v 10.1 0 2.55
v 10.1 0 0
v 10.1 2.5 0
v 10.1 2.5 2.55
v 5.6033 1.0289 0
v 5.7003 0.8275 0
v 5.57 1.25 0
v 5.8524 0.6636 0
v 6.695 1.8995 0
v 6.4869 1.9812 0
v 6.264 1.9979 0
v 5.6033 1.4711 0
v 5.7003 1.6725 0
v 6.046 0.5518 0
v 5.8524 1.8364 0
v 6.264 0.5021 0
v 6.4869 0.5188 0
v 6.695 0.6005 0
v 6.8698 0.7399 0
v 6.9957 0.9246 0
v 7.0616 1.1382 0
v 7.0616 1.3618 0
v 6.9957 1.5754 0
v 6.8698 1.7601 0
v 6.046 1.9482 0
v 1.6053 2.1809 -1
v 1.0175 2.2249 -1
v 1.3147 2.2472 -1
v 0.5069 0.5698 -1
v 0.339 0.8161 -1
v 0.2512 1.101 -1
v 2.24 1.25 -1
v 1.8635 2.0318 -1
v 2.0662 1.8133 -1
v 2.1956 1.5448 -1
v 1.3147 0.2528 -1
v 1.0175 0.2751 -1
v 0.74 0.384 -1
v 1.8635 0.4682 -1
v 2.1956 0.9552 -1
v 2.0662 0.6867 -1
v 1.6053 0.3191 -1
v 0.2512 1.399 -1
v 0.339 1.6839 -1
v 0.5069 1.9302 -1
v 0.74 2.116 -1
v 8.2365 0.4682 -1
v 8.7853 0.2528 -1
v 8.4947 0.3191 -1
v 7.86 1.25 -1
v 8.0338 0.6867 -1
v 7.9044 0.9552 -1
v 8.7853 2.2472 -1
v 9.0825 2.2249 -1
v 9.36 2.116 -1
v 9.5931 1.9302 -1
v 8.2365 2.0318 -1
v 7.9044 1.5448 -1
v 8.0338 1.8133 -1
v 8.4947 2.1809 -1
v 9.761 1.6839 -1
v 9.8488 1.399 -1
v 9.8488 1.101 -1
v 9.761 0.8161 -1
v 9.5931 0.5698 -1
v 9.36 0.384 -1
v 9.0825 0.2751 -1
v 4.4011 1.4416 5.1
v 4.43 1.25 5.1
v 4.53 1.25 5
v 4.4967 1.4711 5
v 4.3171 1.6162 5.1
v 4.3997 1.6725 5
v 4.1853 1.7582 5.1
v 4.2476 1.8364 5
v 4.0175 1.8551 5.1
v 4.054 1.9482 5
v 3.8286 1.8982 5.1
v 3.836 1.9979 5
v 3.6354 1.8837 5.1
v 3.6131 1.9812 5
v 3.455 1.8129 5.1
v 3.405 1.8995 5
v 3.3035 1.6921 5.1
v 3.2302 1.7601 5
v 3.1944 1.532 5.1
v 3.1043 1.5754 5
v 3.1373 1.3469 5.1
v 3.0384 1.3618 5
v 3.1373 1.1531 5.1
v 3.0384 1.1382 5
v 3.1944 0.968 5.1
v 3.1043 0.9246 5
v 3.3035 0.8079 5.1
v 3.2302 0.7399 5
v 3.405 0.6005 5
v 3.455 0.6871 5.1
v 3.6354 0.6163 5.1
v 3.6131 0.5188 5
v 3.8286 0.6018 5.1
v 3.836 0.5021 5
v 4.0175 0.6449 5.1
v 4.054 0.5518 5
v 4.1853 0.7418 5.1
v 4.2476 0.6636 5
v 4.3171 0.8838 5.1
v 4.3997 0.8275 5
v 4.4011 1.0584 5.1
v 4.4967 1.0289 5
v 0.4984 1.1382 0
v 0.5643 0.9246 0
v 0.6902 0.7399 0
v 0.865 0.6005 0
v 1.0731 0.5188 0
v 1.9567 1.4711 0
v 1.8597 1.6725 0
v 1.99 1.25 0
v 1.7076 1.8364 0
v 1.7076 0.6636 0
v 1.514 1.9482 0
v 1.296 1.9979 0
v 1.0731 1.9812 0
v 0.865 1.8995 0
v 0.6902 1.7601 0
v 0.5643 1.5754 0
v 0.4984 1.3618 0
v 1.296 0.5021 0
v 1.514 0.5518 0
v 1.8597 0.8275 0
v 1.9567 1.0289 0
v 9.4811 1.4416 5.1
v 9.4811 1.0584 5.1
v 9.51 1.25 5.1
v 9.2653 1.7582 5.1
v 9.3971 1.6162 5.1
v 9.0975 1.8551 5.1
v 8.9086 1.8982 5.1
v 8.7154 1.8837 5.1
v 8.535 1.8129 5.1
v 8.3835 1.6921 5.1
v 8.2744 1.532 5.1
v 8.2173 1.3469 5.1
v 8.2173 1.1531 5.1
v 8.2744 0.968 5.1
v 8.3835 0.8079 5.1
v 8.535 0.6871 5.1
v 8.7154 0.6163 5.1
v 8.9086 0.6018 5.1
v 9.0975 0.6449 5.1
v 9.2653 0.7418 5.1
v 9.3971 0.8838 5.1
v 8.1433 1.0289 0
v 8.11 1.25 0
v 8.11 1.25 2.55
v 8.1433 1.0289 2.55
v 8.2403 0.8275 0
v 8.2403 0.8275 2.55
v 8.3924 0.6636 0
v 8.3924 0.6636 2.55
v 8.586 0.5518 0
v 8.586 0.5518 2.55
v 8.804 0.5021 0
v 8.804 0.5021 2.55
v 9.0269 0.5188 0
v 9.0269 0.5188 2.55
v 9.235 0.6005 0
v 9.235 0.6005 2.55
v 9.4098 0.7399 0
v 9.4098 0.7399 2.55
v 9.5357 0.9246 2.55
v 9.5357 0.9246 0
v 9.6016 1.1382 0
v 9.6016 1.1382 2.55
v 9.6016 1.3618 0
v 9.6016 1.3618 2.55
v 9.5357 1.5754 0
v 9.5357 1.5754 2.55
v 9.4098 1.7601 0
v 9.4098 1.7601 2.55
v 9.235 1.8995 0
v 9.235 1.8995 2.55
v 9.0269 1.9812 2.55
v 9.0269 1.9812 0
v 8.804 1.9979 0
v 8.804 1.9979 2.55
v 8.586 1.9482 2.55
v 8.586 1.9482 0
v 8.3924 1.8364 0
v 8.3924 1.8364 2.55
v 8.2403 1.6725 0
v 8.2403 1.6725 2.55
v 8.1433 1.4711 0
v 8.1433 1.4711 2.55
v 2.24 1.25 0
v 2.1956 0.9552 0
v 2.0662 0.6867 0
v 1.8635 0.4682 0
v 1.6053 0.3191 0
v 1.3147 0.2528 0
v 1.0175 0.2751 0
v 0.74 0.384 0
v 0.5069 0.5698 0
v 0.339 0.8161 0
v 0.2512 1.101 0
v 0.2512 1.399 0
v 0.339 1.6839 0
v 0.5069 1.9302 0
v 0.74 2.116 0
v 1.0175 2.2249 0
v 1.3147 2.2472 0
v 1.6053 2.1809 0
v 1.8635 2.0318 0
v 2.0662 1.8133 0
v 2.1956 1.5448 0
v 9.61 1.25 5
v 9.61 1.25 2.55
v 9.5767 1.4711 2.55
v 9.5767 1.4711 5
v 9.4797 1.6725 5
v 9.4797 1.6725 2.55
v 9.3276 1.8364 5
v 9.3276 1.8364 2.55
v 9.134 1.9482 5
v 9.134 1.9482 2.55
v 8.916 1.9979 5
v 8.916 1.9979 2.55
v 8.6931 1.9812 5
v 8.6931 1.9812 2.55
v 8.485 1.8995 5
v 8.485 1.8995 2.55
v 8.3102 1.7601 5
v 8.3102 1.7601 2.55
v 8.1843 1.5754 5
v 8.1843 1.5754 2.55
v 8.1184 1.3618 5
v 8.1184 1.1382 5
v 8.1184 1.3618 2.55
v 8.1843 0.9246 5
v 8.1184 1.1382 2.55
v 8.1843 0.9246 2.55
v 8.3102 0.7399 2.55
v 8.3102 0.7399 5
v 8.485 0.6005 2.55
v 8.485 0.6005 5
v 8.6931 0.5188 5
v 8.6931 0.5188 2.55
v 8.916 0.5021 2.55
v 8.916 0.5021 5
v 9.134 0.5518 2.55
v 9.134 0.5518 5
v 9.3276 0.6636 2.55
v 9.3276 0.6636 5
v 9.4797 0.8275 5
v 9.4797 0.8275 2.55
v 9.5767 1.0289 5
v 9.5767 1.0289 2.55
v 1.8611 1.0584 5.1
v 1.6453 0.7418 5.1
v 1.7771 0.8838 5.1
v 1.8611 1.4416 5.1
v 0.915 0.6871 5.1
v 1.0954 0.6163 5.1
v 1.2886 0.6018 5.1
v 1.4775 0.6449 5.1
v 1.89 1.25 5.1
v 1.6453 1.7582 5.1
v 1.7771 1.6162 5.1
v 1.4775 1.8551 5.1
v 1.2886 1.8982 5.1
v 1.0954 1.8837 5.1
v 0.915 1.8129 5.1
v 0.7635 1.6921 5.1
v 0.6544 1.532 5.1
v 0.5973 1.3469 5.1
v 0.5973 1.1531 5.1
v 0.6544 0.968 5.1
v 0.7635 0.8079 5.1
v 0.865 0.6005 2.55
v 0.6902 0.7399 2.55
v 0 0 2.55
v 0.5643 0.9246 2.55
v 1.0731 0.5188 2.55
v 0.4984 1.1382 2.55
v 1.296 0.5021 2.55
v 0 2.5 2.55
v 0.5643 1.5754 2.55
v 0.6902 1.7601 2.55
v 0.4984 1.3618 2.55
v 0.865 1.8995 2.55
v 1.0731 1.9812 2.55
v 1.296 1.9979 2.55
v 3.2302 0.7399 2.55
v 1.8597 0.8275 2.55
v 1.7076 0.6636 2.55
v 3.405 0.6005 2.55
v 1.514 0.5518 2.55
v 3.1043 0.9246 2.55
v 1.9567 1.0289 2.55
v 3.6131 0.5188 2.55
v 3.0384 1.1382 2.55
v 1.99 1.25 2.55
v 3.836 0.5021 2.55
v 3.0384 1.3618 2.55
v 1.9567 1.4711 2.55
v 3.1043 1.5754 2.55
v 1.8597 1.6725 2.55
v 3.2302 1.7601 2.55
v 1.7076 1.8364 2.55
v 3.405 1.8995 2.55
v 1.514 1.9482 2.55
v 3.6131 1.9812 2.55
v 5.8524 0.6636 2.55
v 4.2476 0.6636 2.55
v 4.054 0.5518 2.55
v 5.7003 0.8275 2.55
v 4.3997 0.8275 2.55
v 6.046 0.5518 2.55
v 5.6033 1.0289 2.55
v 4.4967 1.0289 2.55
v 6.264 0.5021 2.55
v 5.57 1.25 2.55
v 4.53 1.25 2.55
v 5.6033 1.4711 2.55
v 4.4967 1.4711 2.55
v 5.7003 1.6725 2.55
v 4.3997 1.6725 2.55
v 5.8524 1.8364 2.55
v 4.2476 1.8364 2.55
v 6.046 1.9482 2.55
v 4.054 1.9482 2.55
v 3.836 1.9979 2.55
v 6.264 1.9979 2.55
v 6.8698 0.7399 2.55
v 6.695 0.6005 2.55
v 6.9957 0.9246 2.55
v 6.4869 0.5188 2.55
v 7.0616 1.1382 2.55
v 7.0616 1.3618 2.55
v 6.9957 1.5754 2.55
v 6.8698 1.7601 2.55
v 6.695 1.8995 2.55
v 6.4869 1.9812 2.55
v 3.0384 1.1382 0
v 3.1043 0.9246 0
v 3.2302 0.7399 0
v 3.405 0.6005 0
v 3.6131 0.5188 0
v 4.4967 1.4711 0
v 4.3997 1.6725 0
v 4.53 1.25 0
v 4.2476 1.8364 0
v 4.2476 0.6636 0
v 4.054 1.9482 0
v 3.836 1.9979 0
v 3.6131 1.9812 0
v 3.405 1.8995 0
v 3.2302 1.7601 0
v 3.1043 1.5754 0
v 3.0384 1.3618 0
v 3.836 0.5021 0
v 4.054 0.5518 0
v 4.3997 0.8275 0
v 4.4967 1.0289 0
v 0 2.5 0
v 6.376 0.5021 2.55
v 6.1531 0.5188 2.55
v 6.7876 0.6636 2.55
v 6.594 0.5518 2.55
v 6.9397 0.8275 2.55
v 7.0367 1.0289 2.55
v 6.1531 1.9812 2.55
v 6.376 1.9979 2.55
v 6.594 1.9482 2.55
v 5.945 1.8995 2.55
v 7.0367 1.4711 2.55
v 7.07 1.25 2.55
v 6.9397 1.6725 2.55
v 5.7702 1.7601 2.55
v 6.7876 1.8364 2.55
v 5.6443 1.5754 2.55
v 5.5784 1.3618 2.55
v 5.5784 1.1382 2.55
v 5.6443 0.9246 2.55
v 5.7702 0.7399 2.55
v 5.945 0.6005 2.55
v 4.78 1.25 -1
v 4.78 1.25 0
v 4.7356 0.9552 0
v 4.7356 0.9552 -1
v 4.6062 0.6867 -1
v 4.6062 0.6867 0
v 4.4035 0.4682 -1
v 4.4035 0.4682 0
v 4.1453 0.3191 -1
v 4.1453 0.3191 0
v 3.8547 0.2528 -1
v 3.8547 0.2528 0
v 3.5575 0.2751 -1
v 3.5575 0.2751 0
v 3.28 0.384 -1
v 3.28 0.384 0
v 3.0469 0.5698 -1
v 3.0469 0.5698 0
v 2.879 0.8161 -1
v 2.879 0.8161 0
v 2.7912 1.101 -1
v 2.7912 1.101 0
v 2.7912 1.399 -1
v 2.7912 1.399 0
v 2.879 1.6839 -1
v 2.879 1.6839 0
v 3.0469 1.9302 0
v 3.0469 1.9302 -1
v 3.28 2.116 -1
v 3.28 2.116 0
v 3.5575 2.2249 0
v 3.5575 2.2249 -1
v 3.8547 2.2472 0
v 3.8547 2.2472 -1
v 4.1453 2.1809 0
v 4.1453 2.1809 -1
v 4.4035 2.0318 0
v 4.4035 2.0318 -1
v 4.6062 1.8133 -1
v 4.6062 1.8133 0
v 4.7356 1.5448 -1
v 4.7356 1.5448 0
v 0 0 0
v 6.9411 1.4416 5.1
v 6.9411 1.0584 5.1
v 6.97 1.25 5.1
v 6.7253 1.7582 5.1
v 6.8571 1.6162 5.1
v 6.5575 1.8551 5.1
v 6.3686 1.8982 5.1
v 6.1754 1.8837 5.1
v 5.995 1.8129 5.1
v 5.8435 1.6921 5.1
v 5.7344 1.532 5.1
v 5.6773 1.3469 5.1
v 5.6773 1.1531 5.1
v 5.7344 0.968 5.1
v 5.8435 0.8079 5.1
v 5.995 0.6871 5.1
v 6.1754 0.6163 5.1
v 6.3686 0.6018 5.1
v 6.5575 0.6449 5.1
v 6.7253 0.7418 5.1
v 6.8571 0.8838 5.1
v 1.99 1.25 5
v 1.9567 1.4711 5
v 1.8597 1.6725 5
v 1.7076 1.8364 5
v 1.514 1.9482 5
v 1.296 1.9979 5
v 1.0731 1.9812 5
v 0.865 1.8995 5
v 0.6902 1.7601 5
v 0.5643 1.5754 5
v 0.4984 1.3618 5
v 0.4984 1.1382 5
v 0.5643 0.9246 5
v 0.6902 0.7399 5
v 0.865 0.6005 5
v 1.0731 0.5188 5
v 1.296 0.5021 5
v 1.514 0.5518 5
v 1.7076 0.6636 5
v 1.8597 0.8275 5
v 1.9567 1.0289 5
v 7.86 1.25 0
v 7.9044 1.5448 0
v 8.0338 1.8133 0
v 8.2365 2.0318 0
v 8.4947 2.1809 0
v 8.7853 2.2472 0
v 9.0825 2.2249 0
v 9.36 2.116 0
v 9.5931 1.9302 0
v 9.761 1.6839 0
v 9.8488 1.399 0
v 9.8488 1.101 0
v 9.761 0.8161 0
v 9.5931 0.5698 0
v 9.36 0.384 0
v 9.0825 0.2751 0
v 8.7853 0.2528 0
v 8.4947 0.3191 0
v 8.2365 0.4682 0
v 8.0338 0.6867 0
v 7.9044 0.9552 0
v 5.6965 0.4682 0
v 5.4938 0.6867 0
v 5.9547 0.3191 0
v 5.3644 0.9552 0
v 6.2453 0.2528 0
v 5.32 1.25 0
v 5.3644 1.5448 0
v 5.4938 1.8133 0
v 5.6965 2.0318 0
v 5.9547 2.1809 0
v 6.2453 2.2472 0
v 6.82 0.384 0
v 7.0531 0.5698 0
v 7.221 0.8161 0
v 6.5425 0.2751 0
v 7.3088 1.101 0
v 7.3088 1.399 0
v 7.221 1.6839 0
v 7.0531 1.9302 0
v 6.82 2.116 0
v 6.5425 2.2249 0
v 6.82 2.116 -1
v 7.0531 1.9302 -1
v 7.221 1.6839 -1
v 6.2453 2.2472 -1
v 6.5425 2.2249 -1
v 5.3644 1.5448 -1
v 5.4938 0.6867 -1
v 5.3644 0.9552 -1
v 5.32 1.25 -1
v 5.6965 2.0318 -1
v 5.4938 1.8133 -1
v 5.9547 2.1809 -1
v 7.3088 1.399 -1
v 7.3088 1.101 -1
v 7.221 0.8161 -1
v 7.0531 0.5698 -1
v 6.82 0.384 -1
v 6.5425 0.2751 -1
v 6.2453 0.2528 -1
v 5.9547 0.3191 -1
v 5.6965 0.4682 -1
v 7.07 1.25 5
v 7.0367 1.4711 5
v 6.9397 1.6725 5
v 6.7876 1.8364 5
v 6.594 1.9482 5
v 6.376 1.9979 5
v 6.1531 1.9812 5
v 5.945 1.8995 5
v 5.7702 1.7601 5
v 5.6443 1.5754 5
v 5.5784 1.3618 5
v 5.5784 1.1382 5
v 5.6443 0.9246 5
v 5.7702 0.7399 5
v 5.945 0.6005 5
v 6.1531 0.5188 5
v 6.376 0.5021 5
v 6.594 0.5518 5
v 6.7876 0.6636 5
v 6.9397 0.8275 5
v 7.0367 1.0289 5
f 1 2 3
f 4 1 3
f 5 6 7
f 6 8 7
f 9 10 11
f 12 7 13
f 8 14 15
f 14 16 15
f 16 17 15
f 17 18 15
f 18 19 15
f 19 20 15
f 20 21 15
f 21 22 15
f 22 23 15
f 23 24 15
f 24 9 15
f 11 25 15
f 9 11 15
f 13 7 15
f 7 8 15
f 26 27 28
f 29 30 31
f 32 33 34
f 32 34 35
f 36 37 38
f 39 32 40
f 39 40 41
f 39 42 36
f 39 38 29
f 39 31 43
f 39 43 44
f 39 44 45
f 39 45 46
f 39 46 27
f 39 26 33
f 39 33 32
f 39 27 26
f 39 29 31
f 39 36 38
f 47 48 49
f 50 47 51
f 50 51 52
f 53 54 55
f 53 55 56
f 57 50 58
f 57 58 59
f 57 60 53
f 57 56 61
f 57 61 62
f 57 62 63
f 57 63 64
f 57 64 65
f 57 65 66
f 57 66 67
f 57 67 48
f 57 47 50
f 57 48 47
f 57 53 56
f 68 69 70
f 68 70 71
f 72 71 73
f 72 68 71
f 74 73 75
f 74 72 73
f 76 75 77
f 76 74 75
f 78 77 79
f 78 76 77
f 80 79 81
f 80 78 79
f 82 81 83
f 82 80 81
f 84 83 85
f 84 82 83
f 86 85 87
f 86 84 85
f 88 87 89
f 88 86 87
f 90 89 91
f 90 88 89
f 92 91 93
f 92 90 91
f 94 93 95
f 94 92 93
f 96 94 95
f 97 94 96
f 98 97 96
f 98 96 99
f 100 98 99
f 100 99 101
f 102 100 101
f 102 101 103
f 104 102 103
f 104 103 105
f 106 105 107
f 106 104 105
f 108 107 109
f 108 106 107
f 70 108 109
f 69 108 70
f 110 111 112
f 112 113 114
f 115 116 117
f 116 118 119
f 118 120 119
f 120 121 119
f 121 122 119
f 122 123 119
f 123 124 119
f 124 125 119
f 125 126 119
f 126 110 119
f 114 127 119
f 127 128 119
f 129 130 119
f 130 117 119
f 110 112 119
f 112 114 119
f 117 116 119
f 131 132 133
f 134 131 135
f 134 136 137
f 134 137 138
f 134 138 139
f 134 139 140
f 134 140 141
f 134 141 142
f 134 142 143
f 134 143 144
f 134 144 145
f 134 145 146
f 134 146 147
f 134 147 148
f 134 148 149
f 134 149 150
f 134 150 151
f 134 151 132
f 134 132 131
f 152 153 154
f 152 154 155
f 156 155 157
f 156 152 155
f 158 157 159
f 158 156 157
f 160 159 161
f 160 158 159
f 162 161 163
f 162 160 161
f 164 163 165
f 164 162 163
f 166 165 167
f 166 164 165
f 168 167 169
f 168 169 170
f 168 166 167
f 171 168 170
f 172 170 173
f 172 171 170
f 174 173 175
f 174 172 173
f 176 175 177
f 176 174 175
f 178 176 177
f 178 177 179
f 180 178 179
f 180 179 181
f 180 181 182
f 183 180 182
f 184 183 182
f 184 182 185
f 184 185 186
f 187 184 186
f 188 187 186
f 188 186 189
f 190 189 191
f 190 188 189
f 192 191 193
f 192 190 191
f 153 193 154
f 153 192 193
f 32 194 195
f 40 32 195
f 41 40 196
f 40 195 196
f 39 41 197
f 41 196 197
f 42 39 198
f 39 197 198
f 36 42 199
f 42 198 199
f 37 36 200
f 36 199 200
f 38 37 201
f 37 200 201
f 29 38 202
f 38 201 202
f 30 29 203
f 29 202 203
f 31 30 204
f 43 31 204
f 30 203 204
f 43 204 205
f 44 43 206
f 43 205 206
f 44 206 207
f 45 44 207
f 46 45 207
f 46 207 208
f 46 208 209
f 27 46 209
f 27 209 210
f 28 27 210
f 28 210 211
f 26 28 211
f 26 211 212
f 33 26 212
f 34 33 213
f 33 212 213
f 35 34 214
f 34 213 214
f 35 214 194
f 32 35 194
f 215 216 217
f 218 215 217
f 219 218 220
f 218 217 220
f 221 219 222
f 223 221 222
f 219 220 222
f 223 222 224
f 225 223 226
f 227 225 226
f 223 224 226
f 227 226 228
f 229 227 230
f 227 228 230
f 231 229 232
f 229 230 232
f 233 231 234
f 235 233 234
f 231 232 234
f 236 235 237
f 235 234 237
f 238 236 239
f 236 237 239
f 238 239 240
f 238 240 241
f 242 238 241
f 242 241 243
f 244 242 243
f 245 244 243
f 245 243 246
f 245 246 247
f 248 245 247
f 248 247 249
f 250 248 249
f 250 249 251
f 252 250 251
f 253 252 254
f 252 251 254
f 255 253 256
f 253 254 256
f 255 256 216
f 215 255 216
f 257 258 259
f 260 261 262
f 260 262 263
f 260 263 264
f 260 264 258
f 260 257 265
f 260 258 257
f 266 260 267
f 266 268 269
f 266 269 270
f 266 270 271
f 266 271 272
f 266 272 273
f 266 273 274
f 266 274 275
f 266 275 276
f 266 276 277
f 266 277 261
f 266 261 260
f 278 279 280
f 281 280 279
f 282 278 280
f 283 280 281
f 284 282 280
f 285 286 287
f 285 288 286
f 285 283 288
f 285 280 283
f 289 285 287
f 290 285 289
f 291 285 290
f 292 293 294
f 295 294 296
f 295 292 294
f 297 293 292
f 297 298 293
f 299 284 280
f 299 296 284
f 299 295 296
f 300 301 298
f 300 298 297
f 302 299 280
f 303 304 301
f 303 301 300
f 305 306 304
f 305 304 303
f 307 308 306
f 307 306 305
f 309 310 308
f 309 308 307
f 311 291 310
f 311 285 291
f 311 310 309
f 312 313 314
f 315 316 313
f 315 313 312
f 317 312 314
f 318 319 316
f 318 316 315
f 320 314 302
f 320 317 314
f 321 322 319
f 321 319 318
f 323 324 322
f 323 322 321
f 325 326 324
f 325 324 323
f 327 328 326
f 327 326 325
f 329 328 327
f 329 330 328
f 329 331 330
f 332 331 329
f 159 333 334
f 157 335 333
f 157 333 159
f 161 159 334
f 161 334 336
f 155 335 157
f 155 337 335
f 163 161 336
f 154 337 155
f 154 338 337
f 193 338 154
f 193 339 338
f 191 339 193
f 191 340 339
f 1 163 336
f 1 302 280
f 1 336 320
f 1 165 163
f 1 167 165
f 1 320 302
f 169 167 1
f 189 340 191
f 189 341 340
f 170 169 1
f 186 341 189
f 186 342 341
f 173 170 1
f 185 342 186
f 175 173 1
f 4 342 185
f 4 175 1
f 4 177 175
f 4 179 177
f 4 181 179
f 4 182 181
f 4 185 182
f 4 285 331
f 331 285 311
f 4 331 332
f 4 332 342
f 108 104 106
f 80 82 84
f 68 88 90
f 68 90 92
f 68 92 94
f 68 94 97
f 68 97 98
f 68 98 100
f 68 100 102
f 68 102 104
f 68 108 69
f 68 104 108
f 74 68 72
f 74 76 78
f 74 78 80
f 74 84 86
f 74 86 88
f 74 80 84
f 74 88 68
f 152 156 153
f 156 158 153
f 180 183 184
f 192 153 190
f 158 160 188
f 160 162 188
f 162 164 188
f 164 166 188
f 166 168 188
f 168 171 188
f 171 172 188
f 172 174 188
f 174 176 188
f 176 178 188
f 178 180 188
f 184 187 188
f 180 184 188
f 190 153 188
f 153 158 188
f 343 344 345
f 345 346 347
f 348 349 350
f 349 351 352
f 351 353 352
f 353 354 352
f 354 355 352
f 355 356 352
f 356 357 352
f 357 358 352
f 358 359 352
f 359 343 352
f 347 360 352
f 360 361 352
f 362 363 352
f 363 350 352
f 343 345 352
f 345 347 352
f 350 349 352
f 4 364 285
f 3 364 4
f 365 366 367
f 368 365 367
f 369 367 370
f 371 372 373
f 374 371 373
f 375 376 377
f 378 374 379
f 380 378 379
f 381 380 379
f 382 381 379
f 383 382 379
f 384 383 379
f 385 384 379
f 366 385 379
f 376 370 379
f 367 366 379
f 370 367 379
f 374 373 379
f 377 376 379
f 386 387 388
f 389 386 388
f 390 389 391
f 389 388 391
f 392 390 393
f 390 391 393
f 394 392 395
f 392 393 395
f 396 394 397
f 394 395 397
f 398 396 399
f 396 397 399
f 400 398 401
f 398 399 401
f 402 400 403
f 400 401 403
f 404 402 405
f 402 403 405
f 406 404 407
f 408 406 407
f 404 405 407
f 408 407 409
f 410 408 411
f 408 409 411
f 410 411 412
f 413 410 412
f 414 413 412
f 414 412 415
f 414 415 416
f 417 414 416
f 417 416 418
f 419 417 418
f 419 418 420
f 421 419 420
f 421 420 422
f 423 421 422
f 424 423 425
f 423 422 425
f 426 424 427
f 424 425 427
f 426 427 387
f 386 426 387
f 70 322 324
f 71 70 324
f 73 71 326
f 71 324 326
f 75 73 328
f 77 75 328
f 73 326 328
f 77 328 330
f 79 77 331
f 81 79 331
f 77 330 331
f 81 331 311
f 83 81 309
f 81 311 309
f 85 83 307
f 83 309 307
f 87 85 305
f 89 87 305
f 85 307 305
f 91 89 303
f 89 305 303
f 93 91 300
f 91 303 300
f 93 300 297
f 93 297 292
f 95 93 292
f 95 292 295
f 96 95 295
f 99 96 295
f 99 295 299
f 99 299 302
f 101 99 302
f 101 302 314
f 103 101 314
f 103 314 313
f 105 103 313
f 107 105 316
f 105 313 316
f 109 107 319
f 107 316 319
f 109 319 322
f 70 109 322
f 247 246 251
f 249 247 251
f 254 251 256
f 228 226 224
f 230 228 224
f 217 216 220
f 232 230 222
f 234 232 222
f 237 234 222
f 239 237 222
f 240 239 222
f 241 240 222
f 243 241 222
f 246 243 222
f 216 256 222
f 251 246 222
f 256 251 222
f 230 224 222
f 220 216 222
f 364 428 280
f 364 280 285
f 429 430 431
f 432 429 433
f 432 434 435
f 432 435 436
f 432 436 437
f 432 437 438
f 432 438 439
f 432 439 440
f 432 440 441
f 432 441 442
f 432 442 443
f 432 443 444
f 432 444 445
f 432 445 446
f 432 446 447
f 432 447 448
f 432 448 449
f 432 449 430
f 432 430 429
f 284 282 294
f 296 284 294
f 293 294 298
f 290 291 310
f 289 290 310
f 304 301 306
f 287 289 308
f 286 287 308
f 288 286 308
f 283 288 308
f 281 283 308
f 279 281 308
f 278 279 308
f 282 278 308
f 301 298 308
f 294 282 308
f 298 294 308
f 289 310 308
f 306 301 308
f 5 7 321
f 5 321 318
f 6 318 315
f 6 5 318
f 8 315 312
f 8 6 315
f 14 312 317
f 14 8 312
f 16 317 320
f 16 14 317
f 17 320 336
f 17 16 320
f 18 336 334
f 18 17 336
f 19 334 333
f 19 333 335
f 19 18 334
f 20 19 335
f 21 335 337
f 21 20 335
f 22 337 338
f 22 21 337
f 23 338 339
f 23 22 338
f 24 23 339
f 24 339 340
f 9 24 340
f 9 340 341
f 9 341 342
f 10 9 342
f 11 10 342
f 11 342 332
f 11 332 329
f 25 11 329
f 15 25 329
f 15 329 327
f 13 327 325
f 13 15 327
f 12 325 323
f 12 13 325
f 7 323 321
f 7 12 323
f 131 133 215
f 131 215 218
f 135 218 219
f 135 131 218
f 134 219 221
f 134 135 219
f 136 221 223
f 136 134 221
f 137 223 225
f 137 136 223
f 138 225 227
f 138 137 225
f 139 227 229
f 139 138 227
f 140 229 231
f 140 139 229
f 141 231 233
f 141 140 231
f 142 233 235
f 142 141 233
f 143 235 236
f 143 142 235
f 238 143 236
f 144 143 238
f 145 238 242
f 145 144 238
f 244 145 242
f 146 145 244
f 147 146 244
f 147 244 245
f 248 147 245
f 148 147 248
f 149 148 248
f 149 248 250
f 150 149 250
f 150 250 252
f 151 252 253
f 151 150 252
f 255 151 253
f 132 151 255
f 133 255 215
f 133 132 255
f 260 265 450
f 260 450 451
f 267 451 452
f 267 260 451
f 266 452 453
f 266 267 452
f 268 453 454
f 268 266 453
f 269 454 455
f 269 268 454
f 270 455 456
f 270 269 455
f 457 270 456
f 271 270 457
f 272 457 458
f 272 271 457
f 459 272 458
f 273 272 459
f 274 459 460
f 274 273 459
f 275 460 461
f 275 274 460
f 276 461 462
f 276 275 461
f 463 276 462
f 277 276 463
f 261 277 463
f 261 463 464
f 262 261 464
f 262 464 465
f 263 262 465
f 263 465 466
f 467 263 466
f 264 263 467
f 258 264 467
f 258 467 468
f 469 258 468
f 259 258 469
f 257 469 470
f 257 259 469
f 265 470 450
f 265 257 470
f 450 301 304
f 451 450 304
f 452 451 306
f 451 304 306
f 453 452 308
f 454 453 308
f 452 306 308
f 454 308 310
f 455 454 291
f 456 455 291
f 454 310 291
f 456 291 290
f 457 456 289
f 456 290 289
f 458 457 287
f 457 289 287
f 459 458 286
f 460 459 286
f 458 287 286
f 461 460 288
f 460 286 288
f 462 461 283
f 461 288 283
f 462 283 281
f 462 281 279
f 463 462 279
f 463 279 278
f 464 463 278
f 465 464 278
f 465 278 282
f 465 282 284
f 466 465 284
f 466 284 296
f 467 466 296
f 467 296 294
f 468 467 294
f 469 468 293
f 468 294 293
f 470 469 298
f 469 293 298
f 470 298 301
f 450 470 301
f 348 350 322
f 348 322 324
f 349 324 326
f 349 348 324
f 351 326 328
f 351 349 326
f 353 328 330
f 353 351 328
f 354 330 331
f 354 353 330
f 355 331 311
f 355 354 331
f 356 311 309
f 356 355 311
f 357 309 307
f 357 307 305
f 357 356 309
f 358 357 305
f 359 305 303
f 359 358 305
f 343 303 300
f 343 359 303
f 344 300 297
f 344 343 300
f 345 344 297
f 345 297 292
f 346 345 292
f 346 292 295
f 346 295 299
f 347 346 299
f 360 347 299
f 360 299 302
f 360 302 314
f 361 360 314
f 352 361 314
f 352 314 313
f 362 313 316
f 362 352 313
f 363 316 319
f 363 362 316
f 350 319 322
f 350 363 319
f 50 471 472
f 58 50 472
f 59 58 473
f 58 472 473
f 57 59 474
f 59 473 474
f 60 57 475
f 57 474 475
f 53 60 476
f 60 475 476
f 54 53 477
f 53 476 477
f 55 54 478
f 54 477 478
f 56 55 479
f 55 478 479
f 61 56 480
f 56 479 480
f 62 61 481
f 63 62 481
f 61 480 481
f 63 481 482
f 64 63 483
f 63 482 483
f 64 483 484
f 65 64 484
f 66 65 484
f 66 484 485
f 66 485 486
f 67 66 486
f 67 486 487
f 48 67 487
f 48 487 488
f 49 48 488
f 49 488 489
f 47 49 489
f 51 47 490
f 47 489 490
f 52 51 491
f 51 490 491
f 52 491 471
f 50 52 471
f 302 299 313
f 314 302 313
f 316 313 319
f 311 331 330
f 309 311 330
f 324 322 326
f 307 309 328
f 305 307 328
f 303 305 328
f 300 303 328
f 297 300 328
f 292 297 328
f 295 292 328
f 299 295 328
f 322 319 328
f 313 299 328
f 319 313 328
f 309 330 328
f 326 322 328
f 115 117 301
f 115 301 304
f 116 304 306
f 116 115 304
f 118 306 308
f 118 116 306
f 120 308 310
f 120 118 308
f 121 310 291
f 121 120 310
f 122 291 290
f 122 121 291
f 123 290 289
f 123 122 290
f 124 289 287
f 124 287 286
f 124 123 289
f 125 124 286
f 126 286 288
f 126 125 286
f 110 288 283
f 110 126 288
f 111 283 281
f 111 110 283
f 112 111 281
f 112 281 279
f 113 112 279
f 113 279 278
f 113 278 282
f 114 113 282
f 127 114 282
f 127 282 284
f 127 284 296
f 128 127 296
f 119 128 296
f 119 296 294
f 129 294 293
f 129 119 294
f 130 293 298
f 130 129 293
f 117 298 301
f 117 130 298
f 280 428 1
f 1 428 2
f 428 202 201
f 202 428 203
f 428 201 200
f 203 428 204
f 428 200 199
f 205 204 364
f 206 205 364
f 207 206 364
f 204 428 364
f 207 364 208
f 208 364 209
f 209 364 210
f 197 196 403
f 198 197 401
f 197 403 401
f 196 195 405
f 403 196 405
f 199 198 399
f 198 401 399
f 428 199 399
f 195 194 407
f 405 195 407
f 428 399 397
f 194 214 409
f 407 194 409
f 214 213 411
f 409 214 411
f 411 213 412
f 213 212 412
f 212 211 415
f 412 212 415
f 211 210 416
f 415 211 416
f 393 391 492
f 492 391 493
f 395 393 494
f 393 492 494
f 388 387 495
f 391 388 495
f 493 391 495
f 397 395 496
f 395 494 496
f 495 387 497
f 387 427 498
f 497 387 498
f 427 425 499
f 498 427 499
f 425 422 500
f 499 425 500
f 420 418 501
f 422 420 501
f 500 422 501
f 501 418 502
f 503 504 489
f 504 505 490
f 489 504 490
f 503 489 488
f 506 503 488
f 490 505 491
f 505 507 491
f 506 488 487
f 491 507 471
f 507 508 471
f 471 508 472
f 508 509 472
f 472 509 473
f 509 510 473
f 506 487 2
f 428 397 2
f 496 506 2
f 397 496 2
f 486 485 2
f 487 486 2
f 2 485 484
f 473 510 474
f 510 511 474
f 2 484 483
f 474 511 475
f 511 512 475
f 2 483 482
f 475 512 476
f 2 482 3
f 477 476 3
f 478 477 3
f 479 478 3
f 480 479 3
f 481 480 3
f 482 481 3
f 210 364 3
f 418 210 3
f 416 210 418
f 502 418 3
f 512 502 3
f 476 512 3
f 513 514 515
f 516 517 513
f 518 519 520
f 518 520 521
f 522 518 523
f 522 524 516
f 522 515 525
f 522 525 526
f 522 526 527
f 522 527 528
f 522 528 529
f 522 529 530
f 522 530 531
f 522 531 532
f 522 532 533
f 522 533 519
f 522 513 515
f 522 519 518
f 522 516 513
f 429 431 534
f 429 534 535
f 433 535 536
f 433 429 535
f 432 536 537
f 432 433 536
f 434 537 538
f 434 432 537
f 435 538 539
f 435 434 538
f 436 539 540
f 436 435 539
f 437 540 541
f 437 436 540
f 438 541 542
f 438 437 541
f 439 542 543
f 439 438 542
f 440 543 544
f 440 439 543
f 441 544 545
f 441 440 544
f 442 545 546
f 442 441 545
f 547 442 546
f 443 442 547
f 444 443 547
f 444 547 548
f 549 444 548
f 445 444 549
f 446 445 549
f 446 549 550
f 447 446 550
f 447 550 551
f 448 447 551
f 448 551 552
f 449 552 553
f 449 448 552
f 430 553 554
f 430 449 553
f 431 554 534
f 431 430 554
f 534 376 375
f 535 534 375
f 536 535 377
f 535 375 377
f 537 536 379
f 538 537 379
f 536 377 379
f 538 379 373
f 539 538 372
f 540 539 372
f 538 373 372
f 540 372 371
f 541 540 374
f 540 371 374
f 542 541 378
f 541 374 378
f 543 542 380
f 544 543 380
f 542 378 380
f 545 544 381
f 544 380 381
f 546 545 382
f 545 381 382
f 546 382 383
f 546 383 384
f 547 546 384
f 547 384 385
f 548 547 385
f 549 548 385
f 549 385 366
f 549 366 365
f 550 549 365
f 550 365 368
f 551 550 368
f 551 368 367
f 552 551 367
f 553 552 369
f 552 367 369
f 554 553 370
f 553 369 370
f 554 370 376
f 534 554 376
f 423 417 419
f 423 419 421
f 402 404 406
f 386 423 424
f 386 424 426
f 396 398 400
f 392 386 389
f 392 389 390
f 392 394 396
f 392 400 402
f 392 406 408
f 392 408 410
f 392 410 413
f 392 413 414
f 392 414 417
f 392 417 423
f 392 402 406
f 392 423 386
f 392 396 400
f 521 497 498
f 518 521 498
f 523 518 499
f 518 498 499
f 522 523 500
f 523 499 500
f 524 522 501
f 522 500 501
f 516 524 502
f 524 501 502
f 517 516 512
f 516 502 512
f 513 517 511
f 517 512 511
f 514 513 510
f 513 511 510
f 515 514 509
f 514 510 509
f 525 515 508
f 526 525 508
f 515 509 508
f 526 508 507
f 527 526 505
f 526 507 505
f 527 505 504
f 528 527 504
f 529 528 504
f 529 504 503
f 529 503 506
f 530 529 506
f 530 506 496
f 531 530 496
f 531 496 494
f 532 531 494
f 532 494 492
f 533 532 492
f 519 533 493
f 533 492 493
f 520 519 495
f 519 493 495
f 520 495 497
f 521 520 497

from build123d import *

# Parameters (mm, degrees)
SKETCH_1_W        = 10.1
SKETCH_1_H        = 2.5
SKETCH_1_R        = 0.75
EXTRUDE_1_DEPTH   = 2.55
SKETCH_2_R        = 1
EXTRUDE_2_DEPTH   = 1
SKETCH_3_R        = 0.75
EXTRUDE_3_DEPTH   = 2.55
EXTRUDE_3_2_DEPTH = 2.55
EXTRUDE_3_3_DEPTH = 2.55
EXTRUDE_3_4_DEPTH = 2.55
CHAMFER_1_SIZE    = 0.1
CHAMFER_2_SIZE    = 0.1
CHAMFER_3_SIZE    = 0.1
CHAMFER_4_SIZE    = 0.1


with BuildPart() as part:
    # 草图1 → 凸台-拉伸1 (new body)
    with BuildSketch(Plane.XY):
        with Locations((5.05, 1.25)):
            Rectangle(SKETCH_1_W, SKETCH_1_H)
        with Locations((3.78, 1.25)):
            Circle(SKETCH_1_R, mode=Mode.SUBTRACT)
        with Locations((1.24, 1.25)):
            Circle(SKETCH_1_R, mode=Mode.SUBTRACT)
        with Locations(Location((8.86, 1.25, 0), (0, 0, 180))):
            Circle(SKETCH_1_R, mode=Mode.SUBTRACT)
        with Locations(Location((6.32, 1.25, 0), (0, 0, 180))):
            Circle(SKETCH_1_R, mode=Mode.SUBTRACT)
    extrude(amount=EXTRUDE_1_DEPTH)

    # 草图2 → 凸台-拉伸2 (add)
    with BuildSketch(Plane(origin=(0, 0, 0), x_dir=(-1, 0, 0), z_dir=(0, 0, -1))):
        with Locations((-6.32, 1.25)):
            Circle(SKETCH_2_R)
        with Locations((-8.86, 1.25)):
            Circle(SKETCH_2_R)
        with Locations(Location((-3.78, 1.25, 0), (0, 0, 180))):
            Circle(SKETCH_2_R)
        with Locations(Location((-1.24, 1.25, 0), (0, 0, 180))):
            Circle(SKETCH_2_R)
    extrude(amount=EXTRUDE_2_DEPTH)


with BuildPart() as body_2:
    # 草图3 → 凸台-拉伸3 (new body)
    with BuildSketch(Plane.XY.offset(2.55)):
        with Locations((3.78, 1.25)):
            Circle(SKETCH_3_R)
    extrude(amount=EXTRUDE_3_DEPTH)

    # 倒角3
    chamfer_3_edges = [body_2.edges().sort_by_distance(p)[0] for p in [
        (3.03, 1.25, 5.1),
    ]]
    chamfer(chamfer_3_edges, length=CHAMFER_3_SIZE)


with BuildPart() as body_3:
    # 草图3 → Extrude 3 2 (new body)
    with BuildSketch(Plane.XY.offset(2.55)):
        with Locations((1.24, 1.25)):
            Circle(SKETCH_3_R)
    extrude(amount=EXTRUDE_3_2_DEPTH)

    # 倒角4
    chamfer_4_edges = [body_3.edges().sort_by_distance(p)[0] for p in [
        (0.49, 1.25, 5.1),
    ]]
    chamfer(chamfer_4_edges, length=CHAMFER_4_SIZE)


with BuildPart() as body_4:
    # 草图3 → Extrude 3 3 (new body)
    with BuildSketch(Plane.XY.offset(2.55)):
        with Locations((6.32, 1.25)):
            Circle(SKETCH_3_R)
    extrude(amount=EXTRUDE_3_3_DEPTH)

    # 倒角2
    chamfer_2_edges = [body_4.edges().sort_by_distance(p)[0] for p in [
        (5.57, 1.25, 5.1),
    ]]
    chamfer(chamfer_2_edges, length=CHAMFER_2_SIZE)


with BuildPart() as body_5:
    # 草图3 → Extrude 3 4 (new body)
    with BuildSketch(Plane.XY.offset(2.55)):
        with Locations((8.86, 1.25)):
            Circle(SKETCH_3_R)
    extrude(amount=EXTRUDE_3_4_DEPTH)

    # 倒角1
    chamfer_1_edges = [body_5.edges().sort_by_distance(p)[0] for p in [
        (8.11, 1.25, 5.1),
    ]]
    chamfer(chamfer_1_edges, length=CHAMFER_1_SIZE)


solid = Compound([part.part, body_2.part, body_3.part, body_4.part, body_5.part])
